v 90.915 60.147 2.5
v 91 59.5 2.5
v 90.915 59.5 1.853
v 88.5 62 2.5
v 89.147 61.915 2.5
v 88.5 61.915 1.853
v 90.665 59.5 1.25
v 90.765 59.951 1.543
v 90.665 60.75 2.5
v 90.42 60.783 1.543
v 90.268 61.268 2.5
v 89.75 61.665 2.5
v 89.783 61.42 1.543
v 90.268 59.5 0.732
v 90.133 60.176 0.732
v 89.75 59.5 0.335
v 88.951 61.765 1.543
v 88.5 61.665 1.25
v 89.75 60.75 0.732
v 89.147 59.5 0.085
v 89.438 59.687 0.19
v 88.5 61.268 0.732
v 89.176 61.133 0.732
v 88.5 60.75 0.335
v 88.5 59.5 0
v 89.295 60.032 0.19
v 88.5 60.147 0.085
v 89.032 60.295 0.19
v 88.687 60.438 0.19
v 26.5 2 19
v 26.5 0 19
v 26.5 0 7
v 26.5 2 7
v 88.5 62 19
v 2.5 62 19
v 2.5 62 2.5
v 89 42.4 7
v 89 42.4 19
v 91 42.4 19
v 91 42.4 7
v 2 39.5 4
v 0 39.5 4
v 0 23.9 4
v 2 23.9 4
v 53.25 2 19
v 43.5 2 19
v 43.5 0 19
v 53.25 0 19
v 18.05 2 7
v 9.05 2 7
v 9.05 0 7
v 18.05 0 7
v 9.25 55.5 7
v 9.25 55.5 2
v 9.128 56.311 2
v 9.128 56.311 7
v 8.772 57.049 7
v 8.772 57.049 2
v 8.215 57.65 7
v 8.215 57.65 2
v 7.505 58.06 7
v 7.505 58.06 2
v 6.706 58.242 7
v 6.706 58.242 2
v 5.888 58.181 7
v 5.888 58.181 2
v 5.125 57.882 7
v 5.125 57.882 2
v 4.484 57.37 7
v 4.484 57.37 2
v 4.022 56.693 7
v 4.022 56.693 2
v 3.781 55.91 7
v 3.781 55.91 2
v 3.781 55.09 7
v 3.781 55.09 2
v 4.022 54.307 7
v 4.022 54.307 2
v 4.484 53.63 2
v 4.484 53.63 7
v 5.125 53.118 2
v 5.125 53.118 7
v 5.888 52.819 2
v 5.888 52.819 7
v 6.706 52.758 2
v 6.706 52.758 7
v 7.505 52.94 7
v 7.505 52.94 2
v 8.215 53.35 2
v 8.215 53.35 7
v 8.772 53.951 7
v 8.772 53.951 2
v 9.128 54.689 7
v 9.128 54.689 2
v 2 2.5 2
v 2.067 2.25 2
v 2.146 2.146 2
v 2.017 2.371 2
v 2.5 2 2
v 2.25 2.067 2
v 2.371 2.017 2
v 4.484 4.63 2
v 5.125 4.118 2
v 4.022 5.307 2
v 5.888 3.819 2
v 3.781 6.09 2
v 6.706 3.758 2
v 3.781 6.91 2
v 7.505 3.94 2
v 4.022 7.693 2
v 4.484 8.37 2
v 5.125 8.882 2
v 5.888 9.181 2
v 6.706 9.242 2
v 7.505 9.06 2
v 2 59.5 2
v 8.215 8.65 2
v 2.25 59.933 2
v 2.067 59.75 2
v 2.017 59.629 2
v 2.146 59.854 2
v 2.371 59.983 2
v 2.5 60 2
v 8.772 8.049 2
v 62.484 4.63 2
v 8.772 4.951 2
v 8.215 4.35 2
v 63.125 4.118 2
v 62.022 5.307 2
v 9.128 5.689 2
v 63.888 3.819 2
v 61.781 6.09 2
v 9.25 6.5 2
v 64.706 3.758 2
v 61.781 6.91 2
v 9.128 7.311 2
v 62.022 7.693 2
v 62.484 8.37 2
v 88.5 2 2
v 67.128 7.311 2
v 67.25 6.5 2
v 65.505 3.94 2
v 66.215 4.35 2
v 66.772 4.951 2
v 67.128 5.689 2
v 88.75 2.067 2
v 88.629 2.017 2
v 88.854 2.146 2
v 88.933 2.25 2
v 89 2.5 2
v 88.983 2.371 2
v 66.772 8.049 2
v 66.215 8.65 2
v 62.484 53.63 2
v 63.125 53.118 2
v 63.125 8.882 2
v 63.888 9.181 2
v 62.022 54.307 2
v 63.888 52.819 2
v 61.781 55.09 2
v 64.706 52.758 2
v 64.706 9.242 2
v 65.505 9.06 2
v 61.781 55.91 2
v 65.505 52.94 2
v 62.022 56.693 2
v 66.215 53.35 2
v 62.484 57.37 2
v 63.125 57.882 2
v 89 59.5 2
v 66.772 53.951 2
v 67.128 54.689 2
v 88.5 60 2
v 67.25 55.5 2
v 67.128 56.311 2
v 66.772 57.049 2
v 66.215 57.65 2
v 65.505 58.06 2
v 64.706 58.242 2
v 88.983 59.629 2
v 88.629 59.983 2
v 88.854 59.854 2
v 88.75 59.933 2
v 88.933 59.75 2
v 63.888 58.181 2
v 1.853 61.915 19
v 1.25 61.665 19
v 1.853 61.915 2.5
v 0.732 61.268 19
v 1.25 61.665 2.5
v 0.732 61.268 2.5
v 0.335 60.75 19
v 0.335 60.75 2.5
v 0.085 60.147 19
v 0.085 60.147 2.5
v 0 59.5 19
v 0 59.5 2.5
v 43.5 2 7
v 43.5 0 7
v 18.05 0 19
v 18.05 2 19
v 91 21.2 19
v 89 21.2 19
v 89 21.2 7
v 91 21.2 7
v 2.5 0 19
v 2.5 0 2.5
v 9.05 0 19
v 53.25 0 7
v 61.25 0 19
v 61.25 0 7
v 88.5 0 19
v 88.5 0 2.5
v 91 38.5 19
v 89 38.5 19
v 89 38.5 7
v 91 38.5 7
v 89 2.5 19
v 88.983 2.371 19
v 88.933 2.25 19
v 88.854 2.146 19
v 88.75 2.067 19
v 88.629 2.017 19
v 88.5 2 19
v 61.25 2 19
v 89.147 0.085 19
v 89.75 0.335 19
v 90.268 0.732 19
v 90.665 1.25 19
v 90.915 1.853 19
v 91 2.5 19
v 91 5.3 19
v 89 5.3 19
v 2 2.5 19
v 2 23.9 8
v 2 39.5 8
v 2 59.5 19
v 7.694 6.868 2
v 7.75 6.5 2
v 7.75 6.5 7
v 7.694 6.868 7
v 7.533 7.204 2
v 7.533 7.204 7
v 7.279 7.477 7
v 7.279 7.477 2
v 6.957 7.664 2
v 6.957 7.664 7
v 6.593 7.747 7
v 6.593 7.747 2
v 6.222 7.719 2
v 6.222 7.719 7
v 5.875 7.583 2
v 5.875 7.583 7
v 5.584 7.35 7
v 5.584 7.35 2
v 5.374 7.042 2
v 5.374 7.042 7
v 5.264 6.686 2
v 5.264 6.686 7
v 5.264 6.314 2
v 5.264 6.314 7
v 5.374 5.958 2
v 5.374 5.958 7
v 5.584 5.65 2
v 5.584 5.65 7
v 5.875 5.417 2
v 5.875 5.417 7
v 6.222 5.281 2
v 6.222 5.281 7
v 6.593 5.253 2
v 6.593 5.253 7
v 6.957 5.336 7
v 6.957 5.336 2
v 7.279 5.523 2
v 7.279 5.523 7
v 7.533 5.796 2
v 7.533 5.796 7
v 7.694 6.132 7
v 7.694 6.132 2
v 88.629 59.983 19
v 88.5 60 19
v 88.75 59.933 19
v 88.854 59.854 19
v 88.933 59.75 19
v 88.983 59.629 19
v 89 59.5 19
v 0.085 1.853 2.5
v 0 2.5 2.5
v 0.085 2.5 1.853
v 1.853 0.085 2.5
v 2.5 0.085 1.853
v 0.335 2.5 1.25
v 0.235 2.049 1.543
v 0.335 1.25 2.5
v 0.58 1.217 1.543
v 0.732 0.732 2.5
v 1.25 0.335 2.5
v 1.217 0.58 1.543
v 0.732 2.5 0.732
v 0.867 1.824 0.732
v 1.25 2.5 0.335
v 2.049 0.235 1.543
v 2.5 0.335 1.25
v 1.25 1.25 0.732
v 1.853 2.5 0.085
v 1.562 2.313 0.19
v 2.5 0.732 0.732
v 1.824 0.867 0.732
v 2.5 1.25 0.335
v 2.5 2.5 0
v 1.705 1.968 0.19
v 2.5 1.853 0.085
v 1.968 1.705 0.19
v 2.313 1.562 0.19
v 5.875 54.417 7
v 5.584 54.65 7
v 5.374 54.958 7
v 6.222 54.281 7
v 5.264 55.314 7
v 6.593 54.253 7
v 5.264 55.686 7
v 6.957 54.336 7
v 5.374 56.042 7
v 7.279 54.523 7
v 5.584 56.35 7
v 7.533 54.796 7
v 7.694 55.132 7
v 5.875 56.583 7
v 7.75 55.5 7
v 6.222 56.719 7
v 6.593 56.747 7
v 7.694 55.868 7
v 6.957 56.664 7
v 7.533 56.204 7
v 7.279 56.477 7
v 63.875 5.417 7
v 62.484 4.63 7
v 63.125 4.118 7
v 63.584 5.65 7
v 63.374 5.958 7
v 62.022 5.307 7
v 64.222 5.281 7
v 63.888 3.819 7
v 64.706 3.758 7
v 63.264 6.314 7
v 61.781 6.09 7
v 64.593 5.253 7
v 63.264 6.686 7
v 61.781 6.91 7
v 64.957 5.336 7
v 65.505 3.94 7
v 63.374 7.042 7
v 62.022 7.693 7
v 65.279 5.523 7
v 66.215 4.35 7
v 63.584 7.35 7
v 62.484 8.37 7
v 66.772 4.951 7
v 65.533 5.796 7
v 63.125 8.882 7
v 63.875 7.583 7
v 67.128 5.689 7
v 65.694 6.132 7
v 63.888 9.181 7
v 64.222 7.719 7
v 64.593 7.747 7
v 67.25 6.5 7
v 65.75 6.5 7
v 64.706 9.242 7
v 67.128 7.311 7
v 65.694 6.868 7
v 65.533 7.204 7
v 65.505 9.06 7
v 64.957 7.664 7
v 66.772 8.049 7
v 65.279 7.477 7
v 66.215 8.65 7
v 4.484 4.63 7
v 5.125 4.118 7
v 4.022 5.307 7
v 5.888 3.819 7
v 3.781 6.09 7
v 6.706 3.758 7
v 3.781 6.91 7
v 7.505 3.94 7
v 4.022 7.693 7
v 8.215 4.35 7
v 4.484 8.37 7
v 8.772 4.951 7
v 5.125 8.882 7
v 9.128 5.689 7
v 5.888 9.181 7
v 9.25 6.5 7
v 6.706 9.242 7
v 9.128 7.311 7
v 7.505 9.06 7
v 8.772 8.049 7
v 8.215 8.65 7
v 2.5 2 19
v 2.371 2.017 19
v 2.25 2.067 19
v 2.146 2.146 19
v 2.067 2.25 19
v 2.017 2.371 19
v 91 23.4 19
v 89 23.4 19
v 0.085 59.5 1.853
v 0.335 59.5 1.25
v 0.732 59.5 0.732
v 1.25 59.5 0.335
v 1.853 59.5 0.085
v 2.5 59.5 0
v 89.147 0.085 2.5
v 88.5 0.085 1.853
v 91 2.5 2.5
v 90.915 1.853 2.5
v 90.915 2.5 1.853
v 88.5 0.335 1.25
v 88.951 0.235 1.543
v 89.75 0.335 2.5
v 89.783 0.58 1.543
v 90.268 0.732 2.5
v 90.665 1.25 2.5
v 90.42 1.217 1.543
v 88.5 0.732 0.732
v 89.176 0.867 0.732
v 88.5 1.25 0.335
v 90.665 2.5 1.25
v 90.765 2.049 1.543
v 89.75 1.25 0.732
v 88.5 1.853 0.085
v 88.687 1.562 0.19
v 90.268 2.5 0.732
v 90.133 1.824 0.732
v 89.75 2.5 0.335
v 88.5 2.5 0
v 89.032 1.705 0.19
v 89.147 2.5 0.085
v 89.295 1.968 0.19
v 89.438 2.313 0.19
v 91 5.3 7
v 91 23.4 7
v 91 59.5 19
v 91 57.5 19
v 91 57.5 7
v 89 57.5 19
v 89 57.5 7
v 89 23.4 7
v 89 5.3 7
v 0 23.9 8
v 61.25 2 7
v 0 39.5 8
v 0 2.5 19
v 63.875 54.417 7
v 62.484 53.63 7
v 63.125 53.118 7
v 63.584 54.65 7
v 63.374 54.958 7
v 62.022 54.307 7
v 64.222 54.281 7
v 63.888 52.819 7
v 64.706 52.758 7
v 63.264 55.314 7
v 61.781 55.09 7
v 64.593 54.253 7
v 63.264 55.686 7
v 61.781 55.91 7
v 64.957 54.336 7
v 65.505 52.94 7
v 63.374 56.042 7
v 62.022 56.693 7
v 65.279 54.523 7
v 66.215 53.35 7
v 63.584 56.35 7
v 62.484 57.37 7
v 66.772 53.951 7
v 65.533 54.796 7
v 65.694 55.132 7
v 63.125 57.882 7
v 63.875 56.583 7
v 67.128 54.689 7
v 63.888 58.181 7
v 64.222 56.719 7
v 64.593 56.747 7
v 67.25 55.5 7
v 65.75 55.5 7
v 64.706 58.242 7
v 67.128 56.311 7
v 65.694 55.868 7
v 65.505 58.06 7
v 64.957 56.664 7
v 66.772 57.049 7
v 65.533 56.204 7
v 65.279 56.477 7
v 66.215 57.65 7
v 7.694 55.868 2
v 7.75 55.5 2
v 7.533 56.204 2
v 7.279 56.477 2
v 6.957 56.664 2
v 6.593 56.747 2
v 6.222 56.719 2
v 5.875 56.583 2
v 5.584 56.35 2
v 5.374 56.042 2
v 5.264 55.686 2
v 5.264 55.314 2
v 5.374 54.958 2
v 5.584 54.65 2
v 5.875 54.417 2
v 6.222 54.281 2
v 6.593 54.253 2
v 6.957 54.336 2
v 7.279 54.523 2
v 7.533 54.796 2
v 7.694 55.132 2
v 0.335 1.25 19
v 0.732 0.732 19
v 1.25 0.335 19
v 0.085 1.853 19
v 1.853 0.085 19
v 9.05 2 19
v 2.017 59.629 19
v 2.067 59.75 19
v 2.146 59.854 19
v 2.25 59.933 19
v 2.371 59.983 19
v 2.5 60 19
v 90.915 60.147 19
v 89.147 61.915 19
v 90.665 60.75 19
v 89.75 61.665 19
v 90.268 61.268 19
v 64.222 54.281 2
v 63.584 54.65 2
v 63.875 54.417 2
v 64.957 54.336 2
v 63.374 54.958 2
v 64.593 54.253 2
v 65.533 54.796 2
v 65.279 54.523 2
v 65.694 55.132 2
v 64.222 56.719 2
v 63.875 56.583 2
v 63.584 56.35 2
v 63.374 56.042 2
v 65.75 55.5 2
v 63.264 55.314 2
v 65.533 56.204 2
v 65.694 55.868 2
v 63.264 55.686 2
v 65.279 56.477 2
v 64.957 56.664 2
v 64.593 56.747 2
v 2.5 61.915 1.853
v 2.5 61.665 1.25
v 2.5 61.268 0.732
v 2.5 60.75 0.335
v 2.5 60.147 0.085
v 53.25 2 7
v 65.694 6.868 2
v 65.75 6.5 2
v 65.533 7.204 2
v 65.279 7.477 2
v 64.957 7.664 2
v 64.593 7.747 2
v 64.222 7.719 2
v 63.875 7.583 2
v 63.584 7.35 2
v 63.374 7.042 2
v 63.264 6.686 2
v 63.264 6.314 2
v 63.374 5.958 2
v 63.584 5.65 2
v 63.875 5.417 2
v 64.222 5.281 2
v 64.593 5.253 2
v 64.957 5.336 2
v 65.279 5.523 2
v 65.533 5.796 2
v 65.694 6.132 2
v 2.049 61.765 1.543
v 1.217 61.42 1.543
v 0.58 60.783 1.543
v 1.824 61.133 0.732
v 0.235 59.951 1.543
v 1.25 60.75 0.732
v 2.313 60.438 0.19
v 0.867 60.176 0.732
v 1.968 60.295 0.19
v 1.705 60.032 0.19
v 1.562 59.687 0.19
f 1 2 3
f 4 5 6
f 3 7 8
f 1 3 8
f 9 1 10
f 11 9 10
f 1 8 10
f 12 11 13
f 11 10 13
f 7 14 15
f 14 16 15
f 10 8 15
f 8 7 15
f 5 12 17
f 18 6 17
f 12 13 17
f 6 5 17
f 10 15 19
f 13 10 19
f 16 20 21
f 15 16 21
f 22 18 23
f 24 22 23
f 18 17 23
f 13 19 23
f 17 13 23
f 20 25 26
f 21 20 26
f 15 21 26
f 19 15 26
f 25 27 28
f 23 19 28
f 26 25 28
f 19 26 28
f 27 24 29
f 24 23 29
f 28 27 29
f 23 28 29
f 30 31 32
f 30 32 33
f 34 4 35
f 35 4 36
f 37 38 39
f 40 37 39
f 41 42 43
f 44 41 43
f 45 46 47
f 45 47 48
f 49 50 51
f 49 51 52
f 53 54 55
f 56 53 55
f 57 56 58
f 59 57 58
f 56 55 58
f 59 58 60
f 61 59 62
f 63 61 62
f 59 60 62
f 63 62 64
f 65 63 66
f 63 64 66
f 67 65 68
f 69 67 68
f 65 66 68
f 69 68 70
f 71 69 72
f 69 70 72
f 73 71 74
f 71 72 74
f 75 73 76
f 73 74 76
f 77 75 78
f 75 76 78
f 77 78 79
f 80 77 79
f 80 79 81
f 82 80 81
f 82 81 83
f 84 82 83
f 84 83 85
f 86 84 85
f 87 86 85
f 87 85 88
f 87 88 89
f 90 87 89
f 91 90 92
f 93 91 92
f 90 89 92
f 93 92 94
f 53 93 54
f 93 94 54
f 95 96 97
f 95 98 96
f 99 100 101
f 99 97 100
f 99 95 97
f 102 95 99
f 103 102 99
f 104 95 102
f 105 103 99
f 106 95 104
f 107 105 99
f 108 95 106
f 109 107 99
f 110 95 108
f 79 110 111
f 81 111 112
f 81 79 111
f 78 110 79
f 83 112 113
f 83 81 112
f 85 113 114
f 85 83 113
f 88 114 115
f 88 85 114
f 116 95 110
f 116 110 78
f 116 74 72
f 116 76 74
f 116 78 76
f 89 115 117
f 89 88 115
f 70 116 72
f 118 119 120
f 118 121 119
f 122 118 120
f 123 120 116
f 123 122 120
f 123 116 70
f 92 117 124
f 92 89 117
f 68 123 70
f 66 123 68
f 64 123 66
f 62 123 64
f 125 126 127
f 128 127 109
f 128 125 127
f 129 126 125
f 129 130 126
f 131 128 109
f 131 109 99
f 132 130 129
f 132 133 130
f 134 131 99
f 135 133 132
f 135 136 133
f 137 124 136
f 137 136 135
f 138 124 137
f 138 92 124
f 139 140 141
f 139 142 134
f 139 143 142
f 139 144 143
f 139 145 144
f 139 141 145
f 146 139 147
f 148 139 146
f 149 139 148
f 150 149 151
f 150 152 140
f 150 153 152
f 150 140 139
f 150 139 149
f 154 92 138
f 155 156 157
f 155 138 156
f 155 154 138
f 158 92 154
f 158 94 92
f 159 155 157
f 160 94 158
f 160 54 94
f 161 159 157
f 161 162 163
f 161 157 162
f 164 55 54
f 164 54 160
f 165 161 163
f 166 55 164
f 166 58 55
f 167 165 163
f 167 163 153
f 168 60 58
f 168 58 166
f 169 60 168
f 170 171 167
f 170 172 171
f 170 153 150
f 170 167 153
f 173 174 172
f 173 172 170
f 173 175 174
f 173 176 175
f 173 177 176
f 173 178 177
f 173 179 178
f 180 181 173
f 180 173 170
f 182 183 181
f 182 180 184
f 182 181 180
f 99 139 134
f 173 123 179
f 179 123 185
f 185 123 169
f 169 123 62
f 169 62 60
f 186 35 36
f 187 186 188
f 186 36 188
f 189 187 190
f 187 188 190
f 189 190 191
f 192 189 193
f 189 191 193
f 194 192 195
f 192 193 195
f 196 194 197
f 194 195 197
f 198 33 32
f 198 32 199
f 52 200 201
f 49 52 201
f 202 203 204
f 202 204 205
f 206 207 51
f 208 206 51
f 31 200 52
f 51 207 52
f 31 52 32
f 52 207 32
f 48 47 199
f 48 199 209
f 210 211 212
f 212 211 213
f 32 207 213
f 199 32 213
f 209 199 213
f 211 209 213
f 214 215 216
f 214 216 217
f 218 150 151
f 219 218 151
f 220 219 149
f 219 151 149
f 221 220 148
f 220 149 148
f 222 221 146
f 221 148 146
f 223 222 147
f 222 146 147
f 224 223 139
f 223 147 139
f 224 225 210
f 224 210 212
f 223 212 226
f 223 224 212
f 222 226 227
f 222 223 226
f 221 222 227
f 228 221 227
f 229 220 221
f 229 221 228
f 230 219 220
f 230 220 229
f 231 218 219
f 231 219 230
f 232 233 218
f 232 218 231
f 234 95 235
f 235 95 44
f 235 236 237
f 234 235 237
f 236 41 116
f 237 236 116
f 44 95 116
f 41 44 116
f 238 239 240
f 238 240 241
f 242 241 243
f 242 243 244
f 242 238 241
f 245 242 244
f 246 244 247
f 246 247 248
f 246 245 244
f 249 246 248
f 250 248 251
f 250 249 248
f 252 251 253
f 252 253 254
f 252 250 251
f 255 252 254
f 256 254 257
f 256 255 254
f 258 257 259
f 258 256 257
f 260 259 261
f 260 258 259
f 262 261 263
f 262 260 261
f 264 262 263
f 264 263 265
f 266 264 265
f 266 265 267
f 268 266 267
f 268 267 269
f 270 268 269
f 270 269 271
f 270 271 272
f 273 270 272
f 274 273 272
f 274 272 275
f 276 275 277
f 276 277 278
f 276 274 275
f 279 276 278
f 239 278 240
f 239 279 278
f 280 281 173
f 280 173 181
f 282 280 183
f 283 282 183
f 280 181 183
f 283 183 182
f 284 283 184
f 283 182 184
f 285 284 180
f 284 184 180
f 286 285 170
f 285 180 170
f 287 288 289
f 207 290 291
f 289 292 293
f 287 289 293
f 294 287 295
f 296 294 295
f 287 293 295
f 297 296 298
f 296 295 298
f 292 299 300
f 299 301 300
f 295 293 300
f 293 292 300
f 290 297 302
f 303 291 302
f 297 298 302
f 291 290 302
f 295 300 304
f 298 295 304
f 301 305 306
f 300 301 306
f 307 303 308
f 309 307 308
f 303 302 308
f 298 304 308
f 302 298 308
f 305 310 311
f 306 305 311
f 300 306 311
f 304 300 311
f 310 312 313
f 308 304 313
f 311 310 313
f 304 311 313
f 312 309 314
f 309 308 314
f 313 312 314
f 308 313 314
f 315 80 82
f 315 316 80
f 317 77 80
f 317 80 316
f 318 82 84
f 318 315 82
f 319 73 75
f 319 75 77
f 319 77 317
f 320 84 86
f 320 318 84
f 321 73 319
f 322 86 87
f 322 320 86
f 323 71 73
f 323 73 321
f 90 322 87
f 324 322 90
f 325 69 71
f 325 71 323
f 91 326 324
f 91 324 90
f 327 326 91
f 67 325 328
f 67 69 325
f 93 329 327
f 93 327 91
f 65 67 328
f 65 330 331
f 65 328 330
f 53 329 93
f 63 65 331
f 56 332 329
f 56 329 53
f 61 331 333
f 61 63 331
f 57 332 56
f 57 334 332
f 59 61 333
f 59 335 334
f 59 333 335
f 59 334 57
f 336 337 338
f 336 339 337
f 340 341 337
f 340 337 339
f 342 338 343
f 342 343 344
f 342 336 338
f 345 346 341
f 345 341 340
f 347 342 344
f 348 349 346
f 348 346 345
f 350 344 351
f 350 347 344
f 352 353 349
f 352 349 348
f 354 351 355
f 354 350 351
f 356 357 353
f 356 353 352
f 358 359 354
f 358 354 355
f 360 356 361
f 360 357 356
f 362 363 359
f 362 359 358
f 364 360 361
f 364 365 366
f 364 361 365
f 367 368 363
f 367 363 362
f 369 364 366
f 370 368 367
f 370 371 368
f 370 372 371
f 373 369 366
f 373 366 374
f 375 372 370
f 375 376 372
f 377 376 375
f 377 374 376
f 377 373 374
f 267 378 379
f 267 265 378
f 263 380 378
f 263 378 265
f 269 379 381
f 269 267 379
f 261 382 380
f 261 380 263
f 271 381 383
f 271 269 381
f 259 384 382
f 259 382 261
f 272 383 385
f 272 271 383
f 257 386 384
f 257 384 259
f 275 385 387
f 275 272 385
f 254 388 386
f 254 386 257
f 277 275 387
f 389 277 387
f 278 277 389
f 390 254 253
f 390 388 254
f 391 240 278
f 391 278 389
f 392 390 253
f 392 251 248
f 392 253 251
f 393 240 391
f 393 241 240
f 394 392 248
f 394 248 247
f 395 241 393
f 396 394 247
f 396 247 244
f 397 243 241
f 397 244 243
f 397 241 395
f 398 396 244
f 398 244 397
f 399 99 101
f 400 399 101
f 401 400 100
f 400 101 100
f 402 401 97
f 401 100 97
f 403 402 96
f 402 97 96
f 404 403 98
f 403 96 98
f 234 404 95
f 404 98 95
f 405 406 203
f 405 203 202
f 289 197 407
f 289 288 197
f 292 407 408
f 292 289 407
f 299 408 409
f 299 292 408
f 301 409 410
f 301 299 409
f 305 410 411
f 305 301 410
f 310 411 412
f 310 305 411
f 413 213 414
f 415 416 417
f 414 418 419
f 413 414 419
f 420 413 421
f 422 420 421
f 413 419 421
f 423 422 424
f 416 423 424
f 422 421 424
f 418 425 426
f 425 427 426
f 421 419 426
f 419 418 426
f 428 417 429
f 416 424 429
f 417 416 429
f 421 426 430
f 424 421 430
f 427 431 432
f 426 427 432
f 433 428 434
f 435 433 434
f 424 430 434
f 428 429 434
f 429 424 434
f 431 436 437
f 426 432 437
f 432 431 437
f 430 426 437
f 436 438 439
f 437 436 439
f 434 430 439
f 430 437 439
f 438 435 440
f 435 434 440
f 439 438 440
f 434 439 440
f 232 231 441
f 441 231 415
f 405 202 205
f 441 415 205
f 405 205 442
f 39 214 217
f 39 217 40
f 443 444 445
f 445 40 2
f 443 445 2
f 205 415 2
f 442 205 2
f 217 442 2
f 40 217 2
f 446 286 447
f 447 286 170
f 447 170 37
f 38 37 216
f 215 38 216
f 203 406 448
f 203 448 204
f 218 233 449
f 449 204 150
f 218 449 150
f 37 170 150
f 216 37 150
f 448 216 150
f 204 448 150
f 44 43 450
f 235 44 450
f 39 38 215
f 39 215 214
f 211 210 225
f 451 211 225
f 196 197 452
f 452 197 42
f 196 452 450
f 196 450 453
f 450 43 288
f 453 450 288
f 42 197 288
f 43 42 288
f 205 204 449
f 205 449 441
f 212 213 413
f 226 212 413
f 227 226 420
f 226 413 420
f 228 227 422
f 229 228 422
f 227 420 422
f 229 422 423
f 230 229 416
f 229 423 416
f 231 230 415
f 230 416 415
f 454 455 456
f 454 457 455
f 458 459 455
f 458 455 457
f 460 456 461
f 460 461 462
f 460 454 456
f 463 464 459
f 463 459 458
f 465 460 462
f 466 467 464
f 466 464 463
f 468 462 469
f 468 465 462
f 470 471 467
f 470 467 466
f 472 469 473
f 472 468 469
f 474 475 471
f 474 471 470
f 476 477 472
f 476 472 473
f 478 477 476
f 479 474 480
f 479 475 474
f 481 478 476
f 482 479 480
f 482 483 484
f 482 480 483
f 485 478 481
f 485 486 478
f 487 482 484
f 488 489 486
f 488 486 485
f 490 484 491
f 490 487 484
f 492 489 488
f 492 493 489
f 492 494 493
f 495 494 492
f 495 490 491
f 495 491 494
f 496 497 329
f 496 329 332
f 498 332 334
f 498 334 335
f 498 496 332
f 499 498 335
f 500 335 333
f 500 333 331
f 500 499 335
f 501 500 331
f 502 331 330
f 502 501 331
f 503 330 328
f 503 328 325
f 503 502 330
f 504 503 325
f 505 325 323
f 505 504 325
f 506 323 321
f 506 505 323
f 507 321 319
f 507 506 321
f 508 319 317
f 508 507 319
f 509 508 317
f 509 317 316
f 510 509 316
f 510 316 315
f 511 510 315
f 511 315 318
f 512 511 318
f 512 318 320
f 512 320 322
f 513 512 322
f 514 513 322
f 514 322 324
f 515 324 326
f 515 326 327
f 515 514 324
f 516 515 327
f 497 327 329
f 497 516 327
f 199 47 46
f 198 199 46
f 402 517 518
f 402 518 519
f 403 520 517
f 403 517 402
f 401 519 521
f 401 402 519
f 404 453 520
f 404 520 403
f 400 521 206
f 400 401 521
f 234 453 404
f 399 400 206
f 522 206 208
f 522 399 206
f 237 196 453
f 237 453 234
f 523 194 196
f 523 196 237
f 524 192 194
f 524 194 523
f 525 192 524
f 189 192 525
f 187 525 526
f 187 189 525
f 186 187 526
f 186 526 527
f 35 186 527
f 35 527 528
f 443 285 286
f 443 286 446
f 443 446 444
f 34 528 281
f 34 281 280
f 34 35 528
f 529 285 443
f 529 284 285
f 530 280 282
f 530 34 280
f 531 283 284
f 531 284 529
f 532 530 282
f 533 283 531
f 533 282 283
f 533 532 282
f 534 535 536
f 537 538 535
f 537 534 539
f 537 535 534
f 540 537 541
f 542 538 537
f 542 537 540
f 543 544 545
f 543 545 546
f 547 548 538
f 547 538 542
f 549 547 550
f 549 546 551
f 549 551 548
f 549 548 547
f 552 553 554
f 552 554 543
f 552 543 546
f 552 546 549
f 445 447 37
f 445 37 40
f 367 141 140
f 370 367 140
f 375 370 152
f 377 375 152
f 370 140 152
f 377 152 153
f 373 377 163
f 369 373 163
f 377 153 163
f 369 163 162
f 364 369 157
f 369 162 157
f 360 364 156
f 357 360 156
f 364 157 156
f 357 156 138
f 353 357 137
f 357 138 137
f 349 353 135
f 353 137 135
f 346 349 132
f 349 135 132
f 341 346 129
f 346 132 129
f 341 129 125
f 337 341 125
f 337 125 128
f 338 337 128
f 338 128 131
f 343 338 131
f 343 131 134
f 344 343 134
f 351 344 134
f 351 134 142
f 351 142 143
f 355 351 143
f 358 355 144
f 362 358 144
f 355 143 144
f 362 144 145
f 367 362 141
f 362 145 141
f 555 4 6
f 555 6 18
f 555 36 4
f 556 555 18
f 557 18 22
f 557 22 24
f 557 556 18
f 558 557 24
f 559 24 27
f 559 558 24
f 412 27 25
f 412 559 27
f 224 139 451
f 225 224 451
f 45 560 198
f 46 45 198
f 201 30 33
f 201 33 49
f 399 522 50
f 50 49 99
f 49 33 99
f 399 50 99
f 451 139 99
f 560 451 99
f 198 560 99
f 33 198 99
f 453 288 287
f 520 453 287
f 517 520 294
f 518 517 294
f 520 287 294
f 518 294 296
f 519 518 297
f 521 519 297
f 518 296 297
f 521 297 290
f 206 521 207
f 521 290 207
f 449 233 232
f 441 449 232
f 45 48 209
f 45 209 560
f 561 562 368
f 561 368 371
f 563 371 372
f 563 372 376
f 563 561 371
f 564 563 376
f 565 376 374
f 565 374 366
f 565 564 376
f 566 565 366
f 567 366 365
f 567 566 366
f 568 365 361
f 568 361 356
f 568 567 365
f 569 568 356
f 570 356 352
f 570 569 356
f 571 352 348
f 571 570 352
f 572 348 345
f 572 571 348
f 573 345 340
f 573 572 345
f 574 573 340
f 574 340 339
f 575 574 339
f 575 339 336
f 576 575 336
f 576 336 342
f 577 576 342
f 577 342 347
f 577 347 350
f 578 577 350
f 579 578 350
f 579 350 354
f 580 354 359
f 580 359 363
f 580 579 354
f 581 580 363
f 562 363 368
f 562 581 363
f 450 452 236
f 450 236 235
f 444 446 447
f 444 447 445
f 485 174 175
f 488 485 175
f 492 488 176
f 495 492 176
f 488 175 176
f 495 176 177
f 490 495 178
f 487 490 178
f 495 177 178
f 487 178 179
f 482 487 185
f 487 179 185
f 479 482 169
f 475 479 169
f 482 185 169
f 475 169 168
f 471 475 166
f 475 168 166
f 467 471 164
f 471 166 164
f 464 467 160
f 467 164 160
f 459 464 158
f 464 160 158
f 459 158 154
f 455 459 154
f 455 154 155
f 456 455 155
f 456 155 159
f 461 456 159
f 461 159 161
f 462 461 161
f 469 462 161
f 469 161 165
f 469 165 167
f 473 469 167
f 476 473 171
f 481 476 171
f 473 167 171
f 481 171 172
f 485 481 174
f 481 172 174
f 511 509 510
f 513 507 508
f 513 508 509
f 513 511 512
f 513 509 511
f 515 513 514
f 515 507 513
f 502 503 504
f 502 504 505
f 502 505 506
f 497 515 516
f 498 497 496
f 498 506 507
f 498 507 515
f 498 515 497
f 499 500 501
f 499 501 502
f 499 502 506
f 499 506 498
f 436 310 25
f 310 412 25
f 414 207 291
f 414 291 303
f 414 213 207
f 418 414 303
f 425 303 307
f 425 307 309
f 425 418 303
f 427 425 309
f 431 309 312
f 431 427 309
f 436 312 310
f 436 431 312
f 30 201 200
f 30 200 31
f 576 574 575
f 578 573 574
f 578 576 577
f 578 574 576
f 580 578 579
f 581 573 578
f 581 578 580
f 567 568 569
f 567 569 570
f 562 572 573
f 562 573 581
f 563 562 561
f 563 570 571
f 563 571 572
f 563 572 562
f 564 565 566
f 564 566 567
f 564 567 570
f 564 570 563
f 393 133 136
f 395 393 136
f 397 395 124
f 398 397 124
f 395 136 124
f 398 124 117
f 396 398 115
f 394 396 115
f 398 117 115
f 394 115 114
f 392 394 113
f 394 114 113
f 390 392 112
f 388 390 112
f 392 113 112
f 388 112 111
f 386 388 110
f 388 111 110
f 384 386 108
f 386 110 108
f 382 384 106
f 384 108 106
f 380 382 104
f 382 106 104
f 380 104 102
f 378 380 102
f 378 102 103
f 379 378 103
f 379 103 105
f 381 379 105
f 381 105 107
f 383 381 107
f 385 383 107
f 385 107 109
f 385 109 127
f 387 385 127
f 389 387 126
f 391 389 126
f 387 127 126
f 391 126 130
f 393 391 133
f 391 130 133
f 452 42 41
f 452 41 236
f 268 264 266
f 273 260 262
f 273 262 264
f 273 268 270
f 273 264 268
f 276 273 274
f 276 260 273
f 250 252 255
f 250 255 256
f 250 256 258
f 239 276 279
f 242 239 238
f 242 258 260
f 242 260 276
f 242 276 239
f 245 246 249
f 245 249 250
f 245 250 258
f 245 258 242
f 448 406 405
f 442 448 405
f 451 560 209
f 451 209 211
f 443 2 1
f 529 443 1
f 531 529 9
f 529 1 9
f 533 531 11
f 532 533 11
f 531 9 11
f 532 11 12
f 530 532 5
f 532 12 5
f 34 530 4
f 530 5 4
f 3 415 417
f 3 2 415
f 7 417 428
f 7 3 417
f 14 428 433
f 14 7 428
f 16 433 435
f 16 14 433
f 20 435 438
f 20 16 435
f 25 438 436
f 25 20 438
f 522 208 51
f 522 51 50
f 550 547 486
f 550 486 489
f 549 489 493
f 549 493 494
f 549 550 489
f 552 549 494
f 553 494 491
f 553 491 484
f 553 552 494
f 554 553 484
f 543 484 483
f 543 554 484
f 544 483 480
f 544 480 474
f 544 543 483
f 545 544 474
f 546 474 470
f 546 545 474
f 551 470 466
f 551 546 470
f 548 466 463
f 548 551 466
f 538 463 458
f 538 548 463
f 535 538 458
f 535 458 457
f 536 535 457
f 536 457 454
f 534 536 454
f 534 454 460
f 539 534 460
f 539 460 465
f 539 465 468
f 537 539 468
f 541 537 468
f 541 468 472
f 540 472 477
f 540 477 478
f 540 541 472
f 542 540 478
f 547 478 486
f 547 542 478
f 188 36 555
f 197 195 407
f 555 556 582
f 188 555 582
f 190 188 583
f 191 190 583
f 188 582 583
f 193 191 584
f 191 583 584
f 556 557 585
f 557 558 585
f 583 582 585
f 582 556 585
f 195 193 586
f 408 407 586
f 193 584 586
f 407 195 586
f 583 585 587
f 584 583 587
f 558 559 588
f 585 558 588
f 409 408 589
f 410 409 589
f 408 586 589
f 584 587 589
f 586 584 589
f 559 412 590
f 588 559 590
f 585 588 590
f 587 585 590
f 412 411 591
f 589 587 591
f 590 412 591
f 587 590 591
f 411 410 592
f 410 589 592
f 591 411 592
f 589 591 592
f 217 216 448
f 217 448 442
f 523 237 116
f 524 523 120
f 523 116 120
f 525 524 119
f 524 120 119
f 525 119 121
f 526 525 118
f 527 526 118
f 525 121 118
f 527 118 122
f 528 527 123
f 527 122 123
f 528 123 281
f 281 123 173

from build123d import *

# Parameters (mm, degrees)
F1_DEPTH = 2
F2_DEPTH = 19
F3_R     = 2.75
F3_R_2   = 1.25
F4_DEPTH = 5
F5_W     = 9
F5_H     = 2
F5_W_2   = 17
F5_W_3   = 8
F5_W_4   = 2
F5_H_2   = 15.1
F5_H_3   = 15.9
F6_DEPTH = 12
F7_W     = 15.6
F7_H     = 4
F8_DEPTH = 5
F9_R     = 2.5


with BuildPart() as f1:
    # F0 (on Top) → F1 (new body)
    with BuildSketch(Plane.XY):
        with BuildLine():
            ThreePointArc((0, 2.5), (0.732233047, 0.732233047), (2.5, 0))
            Line((2.5, 0), (88.5, 0))
            ThreePointArc((88.5, 0), (90.267766953, 0.732233047), (91, 2.5))
            Line((91, 2.5), (91, 59.5))
            ThreePointArc((91, 59.5), (90.267766953, 61.267766953), (88.5, 62))
            Line((88.5, 62), (2.5, 62))
            ThreePointArc((2.5, 62), (0.732233047, 61.267766953), (0, 59.5))
            Line((0, 59.5), (0, 2.5))
        make_face()
        with BuildLine():
            ThreePointArc((2, 59.5), (2.1464466094, 59.8535533906), (2.5, 60))
            Line((2.5, 60), (88.5, 60))
            ThreePointArc((88.5, 60), (88.8535533906, 59.8535533906), (89, 59.5))
            Line((89, 59.5), (89, 2.5))
            ThreePointArc((89, 2.5), (88.8535533906, 2.1464466094), (88.5, 2))
            Line((88.5, 2), (2.5, 2))
            ThreePointArc((2.5, 2), (2.1464466094, 2.1464466094), (2, 2.5))
            Line((2, 2.5), (2, 59.5))
        make_face(mode=Mode.SUBTRACT)
        with BuildLine():
            Line((88.5, 60), (2.5, 60))
            ThreePointArc((2.5, 60), (2.1464466094, 59.8535533906), (2, 59.5))
            Line((2, 59.5), (2, 2.5))
            ThreePointArc((2, 2.5), (2.1464466094, 2.1464466094), (2.5, 2))
            Line((2.5, 2), (88.5, 2))
            ThreePointArc((88.5, 2), (88.8535533906, 2.1464466094), (89, 2.5))
            Line((89, 2.5), (89, 59.5))
            ThreePointArc((89, 59.5), (88.8535533906, 59.8535533906), (88.5, 60))
        make_face()
    extrude(amount=F1_DEPTH)

    # F0 (on Top) → F2 (join)
    with BuildSketch(Plane.XY):
        with BuildLine():
            ThreePointArc((0, 2.5), (0.732233047, 0.732233047), (2.5, 0))
            Line((2.5, 0), (88.5, 0))
            ThreePointArc((88.5, 0), (90.267766953, 0.732233047), (91, 2.5))
            Line((91, 2.5), (91, 59.5))
            ThreePointArc((91, 59.5), (90.267766953, 61.267766953), (88.5, 62))
            Line((88.5, 62), (2.5, 62))
            ThreePointArc((2.5, 62), (0.732233047, 61.267766953), (0, 59.5))
            Line((0, 59.5), (0, 2.5))
        make_face()
        with BuildLine():
            ThreePointArc((2, 59.5), (2.1464466094, 59.8535533906), (2.5, 60))
            Line((2.5, 60), (88.5, 60))
            ThreePointArc((88.5, 60), (88.8535533906, 59.8535533906), (89, 59.5))
            Line((89, 59.5), (89, 2.5))
            ThreePointArc((89, 2.5), (88.8535533906, 2.1464466094), (88.5, 2))
            Line((88.5, 2), (2.5, 2))
            ThreePointArc((2.5, 2), (2.1464466094, 2.1464466094), (2, 2.5))
            Line((2, 2.5), (2, 59.5))
        make_face(mode=Mode.SUBTRACT)
    extrude(amount=F2_DEPTH)

    # F3 (on face) → F4 (join)
    with BuildSketch(Plane.XY.offset(2)):
        with Locations((6.5, 55.5)):
            Circle(F3_R)
        with Locations((6.5, 55.5)):
            Circle(F3_R_2, mode=Mode.SUBTRACT)
        with Locations((64.5, 55.5)):
            Circle(F3_R)
        with Locations((64.5, 55.5)):
            Circle(F3_R_2, mode=Mode.SUBTRACT)
        with Locations((6.5, 6.5)):
            Circle(F3_R)
        with Locations((6.5, 6.5)):
            Circle(F3_R_2, mode=Mode.SUBTRACT)
        with Locations((64.5, 6.5)):
            Circle(F3_R)
        with Locations((64.5, 6.5)):
            Circle(F3_R_2, mode=Mode.SUBTRACT)
    extrude(amount=F4_DEPTH)

    # F5 (on face) → F6 (cut)
    with BuildSketch(Plane.XY.offset(19)):
        with Locations((13.55, 1)):
            Rectangle(F5_W, F5_H)
        with Locations((35, 1)):
            Rectangle(F5_W_2, F5_H)
        with Locations((57.25, 1)):
            Rectangle(F5_W_3, F5_H)
        with Locations((90, 49.95)):
            Rectangle(F5_W_4, F5_H_2)
        with Locations((90, 30.95)):
            Rectangle(F5_W_4, F5_H_2)
        with Locations((90, 13.25)):
            Rectangle(F5_W_4, F5_H_3)
    extrude(amount=-F6_DEPTH, mode=Mode.SUBTRACT)

    # F7 (on face) → F8 (cut)
    with BuildSketch(Plane(origin=(0, 0, 0), x_dir=(0, -1, 0), z_dir=(-1, 0, 0))):
        with Locations((-31.7, 6)):
            Rectangle(F7_W, F7_H)
    extrude(amount=-F8_DEPTH, mode=Mode.SUBTRACT)

    # F9
    f9_edges = [f1.edges().sort_by_distance(p)[0] for p in [
        (45.5, 0, 0),
    ]]
    fillet(f9_edges, radius=F9_R)


solid = f1.part
